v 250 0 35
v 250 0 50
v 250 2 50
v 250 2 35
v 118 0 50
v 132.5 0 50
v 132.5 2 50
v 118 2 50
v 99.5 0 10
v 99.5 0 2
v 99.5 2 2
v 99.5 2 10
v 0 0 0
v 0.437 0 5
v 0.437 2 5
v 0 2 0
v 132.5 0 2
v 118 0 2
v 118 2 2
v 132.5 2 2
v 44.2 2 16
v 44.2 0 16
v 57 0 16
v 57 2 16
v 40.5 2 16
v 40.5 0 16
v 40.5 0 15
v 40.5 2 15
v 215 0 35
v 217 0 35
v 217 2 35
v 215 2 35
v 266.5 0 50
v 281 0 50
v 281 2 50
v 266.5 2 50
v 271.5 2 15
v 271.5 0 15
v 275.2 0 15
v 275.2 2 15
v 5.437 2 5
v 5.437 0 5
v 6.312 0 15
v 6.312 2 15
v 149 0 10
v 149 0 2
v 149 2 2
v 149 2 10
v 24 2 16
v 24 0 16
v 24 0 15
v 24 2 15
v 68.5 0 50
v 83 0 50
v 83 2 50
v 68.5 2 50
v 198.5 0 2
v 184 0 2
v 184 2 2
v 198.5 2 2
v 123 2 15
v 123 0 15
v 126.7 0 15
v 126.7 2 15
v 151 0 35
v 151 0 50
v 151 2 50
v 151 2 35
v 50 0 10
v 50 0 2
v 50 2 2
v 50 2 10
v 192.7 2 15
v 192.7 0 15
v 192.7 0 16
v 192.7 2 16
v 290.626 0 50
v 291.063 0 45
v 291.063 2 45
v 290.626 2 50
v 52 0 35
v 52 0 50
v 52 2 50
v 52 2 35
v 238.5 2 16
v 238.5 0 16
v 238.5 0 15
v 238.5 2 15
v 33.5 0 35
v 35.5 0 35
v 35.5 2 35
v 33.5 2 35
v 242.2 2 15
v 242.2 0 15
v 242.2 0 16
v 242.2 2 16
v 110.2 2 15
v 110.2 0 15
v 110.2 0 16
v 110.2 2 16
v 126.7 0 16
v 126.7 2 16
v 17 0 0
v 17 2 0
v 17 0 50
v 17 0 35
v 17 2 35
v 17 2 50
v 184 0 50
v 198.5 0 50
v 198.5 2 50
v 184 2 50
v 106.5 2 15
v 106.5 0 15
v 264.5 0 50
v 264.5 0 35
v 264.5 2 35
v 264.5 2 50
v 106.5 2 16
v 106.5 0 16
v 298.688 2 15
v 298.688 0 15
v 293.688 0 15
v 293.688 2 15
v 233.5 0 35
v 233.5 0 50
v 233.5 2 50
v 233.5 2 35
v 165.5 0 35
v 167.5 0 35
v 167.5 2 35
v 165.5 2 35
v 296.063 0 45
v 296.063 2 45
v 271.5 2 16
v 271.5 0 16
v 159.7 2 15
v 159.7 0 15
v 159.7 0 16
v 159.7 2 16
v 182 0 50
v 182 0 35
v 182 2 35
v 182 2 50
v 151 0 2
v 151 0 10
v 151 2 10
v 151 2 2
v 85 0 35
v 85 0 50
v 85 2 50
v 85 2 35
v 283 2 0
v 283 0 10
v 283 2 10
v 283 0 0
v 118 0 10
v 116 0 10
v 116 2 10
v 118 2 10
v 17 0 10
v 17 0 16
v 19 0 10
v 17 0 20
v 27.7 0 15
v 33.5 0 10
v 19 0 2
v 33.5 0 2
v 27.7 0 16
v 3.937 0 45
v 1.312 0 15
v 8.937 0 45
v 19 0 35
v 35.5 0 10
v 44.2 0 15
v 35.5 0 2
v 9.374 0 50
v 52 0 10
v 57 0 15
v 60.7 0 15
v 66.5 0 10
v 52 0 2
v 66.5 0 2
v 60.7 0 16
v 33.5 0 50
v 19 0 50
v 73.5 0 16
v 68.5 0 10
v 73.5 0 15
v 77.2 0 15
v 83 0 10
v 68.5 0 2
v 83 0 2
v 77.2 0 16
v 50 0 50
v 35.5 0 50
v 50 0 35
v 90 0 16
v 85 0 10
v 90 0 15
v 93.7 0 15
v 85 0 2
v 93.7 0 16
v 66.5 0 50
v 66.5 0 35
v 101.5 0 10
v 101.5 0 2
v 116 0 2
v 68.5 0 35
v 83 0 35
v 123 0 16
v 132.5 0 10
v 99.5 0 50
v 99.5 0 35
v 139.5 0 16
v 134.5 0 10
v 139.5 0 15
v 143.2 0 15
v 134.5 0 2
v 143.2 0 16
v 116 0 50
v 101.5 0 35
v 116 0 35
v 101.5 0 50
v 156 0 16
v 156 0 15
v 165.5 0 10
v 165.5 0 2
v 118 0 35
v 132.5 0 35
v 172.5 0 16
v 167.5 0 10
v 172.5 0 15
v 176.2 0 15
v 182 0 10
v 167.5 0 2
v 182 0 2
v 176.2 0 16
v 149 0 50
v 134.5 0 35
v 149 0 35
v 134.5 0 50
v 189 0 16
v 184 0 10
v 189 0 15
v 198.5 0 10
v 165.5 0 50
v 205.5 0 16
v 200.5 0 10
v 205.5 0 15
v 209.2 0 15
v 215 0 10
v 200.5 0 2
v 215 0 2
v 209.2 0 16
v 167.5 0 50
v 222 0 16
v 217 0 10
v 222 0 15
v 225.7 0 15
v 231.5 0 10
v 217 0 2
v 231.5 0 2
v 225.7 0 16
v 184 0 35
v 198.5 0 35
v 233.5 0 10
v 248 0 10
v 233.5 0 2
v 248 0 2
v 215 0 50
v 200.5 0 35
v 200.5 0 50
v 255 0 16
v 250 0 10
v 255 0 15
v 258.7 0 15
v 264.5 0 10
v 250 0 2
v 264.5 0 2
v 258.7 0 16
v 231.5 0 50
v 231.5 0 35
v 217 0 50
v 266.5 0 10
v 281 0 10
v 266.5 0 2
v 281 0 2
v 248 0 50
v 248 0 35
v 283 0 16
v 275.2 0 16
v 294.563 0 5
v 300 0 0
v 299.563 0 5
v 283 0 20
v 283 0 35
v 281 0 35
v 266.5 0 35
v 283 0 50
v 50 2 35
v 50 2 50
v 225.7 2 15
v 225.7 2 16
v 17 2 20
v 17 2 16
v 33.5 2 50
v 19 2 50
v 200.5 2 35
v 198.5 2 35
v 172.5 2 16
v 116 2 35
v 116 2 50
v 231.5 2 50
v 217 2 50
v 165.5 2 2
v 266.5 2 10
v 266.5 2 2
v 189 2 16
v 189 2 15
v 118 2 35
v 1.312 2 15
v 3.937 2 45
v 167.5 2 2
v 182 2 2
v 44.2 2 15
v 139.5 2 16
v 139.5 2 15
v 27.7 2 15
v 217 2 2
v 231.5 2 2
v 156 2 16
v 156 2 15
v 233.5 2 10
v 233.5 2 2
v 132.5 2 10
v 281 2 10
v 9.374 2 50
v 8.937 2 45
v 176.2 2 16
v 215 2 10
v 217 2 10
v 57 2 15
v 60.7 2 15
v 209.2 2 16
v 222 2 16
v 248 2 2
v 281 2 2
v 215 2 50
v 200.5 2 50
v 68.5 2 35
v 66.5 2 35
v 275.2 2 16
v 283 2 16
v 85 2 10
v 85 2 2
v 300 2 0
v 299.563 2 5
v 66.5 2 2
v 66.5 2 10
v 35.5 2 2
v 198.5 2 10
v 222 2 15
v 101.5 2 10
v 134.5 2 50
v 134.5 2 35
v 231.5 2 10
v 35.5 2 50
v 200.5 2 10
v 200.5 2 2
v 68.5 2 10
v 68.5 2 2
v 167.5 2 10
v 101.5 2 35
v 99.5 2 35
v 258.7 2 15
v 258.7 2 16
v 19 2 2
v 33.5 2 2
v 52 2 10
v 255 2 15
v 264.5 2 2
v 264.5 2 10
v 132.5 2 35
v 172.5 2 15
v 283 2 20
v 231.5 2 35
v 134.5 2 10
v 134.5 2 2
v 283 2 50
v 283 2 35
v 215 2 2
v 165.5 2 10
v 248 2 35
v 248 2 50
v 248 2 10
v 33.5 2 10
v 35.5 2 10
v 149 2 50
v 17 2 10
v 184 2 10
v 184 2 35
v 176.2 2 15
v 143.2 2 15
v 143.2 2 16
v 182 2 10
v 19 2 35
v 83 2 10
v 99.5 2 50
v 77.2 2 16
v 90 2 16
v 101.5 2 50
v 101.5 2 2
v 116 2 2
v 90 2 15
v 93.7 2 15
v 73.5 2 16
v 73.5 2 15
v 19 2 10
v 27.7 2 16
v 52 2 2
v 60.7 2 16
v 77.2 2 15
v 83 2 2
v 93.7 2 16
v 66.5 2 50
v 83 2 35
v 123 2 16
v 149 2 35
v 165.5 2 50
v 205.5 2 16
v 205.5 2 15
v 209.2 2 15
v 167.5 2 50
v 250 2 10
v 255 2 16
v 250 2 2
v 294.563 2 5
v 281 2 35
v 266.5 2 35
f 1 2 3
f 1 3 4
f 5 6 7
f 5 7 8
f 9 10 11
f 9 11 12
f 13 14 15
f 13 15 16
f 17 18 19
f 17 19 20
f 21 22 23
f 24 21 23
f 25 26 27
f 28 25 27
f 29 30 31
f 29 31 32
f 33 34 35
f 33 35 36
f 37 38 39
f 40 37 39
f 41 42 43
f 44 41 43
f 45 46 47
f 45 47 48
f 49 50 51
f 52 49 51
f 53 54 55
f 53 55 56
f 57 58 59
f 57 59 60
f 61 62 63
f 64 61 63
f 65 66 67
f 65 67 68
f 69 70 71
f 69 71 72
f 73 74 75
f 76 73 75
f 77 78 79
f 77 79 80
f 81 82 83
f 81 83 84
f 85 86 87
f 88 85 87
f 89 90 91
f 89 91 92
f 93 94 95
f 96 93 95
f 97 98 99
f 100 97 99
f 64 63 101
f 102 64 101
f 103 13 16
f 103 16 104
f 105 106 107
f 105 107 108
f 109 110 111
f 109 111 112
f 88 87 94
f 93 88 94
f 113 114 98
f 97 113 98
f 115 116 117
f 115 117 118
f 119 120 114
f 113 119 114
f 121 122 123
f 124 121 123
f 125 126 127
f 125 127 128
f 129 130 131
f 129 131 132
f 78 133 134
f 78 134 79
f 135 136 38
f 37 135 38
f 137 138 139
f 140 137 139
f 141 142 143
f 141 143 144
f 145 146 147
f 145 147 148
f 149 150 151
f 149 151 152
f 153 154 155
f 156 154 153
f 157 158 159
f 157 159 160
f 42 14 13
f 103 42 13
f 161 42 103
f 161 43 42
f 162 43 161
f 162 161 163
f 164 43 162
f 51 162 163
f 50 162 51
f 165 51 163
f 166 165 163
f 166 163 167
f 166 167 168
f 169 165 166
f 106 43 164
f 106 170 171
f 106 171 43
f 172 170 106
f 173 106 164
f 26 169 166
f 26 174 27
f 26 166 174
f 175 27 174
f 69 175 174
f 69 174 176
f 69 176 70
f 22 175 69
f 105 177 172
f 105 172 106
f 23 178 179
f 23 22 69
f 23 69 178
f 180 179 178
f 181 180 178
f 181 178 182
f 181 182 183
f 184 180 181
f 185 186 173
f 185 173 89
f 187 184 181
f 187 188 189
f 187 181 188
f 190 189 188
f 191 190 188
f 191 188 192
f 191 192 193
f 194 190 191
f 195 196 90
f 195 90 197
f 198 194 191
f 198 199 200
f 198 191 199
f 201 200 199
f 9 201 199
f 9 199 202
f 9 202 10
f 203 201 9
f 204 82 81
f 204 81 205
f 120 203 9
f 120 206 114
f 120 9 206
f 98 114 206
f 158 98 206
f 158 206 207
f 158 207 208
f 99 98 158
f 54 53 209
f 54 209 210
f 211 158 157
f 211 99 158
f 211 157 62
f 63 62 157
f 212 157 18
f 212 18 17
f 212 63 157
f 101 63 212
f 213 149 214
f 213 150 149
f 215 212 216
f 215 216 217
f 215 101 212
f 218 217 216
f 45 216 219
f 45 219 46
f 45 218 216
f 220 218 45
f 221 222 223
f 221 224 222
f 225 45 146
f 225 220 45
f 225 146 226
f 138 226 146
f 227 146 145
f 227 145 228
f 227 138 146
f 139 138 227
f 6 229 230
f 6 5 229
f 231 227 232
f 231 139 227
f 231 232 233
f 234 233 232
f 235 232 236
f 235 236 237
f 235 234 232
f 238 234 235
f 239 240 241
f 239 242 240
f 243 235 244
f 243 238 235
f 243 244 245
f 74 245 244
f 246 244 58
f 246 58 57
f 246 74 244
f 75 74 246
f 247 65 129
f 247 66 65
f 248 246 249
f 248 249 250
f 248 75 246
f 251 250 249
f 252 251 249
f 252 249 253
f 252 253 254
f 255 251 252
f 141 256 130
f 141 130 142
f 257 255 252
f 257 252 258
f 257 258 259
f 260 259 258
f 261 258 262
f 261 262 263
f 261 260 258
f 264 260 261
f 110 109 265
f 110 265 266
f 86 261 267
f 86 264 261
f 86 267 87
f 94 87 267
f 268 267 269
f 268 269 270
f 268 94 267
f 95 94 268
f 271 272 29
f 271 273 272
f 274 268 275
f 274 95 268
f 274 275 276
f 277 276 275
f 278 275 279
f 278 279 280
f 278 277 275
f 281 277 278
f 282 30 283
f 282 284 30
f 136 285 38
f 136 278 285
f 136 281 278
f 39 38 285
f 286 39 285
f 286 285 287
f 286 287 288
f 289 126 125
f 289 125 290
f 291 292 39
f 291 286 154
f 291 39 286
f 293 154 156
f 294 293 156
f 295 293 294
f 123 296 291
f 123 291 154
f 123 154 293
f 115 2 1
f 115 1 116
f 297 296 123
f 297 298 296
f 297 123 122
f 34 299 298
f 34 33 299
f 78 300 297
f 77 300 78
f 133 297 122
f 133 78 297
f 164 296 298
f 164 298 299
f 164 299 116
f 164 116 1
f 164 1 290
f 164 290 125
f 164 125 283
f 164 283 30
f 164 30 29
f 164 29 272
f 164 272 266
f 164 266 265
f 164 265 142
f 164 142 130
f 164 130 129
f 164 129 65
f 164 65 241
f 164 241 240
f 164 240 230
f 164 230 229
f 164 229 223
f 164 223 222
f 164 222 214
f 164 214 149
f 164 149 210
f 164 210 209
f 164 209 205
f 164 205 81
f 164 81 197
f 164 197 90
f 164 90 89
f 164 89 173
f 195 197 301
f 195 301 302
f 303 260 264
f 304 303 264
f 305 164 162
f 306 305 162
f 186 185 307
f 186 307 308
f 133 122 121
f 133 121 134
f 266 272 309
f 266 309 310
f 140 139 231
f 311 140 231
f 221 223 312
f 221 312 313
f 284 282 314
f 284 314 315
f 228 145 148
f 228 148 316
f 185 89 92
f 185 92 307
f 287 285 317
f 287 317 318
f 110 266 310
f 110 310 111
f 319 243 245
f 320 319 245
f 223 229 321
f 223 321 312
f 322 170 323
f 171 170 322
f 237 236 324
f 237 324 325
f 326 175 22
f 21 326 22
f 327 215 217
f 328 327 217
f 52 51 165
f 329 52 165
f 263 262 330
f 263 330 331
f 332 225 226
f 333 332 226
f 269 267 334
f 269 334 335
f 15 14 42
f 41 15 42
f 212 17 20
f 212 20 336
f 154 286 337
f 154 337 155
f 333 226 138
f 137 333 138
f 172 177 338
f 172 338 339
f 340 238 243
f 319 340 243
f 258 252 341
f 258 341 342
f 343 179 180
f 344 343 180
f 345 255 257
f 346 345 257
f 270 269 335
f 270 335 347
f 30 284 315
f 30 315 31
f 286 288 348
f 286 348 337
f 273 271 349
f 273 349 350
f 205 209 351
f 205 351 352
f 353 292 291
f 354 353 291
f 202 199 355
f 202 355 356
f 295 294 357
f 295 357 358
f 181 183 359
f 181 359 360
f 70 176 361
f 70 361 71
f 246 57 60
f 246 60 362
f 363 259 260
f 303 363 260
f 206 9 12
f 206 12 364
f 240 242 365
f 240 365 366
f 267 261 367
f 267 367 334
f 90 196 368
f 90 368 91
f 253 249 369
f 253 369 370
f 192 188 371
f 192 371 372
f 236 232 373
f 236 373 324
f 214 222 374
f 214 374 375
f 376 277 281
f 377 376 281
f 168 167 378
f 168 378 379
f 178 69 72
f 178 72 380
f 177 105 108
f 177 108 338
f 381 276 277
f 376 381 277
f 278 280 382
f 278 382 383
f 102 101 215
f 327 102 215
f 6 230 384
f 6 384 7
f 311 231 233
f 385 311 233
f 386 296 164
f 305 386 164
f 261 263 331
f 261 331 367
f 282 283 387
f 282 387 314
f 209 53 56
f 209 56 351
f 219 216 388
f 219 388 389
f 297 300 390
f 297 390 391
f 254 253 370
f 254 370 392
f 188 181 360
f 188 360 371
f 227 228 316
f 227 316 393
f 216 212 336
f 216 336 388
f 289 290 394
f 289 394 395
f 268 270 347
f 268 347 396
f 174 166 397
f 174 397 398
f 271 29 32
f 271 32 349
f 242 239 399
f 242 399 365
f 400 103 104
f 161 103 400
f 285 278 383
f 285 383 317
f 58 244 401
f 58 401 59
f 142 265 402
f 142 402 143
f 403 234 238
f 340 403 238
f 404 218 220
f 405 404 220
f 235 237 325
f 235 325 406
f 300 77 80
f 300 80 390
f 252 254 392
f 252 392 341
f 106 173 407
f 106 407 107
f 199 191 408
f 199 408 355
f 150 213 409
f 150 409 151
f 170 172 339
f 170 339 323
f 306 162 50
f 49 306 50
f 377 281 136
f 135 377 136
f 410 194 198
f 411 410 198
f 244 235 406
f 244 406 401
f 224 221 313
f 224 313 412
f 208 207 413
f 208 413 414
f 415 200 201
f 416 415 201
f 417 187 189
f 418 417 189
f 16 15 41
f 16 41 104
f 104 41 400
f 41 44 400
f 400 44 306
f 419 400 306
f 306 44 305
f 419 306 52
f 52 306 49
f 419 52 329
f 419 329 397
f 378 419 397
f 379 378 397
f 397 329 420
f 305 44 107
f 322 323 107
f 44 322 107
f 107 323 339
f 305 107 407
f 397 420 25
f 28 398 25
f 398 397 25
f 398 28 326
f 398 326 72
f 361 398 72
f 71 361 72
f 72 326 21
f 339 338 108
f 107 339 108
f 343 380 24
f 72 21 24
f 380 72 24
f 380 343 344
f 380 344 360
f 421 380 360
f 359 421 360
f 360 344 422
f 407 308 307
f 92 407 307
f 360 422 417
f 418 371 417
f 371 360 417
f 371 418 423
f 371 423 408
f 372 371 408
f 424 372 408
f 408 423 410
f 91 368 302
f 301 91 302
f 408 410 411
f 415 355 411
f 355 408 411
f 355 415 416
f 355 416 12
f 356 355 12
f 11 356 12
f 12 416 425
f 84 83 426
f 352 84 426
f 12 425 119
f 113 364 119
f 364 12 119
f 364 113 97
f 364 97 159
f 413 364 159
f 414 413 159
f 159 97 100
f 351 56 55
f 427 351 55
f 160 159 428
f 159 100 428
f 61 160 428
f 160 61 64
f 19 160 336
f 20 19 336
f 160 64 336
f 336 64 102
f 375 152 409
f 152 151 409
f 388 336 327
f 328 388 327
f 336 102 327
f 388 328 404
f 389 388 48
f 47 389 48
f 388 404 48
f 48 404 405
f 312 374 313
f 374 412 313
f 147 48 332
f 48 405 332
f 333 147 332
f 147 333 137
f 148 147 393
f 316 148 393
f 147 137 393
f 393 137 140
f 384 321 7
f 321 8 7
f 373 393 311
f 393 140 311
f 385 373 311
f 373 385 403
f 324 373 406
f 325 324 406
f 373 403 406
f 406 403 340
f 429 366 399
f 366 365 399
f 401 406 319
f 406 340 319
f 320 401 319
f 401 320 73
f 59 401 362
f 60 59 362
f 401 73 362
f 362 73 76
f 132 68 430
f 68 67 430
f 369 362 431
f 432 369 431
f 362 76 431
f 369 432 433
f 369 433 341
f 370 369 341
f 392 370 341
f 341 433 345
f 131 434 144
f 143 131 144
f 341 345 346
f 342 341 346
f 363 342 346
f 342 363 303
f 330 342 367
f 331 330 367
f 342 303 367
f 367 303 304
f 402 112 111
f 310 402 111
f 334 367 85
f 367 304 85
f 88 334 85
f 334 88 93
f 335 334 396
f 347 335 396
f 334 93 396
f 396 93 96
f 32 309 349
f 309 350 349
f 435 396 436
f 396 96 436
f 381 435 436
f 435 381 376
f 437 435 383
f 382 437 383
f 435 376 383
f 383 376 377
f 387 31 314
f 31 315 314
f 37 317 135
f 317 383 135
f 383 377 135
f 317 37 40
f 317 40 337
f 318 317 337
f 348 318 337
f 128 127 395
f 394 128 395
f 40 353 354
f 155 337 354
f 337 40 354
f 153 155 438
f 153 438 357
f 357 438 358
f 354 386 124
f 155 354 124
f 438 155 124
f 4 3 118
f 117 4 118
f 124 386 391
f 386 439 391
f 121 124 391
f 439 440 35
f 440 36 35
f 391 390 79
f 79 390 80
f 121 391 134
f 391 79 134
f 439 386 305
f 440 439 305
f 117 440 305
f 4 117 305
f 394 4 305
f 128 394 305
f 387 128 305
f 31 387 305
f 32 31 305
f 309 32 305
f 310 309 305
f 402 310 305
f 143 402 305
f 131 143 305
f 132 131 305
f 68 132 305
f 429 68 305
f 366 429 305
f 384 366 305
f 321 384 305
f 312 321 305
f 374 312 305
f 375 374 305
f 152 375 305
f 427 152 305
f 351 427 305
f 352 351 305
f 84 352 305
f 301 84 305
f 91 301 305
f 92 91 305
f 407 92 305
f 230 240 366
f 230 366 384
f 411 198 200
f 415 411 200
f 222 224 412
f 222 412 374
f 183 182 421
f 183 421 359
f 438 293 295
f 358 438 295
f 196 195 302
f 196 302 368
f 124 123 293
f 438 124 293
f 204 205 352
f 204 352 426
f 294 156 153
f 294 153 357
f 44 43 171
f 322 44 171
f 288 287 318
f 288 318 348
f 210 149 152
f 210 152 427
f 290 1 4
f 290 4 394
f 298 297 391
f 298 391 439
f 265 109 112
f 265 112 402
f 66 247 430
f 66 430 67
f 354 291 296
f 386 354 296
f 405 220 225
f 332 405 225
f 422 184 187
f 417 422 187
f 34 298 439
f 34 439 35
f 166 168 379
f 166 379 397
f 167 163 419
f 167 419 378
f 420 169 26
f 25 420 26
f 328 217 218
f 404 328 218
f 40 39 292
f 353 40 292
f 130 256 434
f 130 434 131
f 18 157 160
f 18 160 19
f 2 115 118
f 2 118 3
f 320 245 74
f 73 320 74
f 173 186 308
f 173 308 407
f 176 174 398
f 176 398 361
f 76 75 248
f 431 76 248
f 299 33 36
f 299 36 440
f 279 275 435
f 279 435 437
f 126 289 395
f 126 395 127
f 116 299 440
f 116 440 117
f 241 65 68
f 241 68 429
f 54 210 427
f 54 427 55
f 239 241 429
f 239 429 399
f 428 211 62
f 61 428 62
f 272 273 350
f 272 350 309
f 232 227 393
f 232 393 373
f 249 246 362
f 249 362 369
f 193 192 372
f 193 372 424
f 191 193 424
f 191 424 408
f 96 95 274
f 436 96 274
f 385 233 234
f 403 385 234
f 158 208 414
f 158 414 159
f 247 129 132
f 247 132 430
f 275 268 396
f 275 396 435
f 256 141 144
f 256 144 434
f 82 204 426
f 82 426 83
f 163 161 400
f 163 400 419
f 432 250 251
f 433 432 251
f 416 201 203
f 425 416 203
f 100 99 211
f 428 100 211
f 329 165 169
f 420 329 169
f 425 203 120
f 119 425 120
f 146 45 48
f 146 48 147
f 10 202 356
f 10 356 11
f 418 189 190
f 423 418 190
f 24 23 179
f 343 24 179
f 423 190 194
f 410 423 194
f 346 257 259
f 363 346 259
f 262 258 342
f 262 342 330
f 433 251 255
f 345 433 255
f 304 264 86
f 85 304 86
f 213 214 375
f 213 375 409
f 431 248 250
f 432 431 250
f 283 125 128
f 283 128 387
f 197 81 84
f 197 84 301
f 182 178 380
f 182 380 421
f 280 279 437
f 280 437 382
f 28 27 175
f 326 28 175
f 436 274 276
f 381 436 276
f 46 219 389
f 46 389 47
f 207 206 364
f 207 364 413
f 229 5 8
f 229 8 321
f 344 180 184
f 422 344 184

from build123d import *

# Parameters (mm, degrees)
F1_DEPTH = 2
F3_DEPTH = 2


with BuildPart() as f1:
    # F0 (on Front) → F1 (new body)
    with BuildSketch(Plane.XZ):
        Polygon((3.9369898587, 45), (0, 0), (17, 0), (17, 10), (19, 10), (19, 2), (33.5, 2), (33.5, 10), (35.5, 10), (35.5, 2), (50, 2), (50, 10), (52, 10), (52, 2), (66.5, 2), (66.5, 10), (68.5, 10), (68.5, 2), (83, 2), (83, 10), (85, 10), (85, 2), (99.5, 2), (99.5, 10), (101.5, 10), (101.5, 2), (116, 2), (116, 10), (118, 10), (118, 2), (132.5, 2), (132.5, 10), (134.5, 10), (134.5, 2), (149, 2), (149, 10), (151, 10), (151, 2), (165.5, 2), (165.5, 10), (167.5, 10), (167.5, 2), (182, 2), (182, 10), (184, 10), (184, 2), (198.5, 2), (198.5, 10), (200.5, 10), (200.5, 2), (215, 2), (215, 10), (217, 10), (217, 2), (231.5, 2), (231.5, 10), (233.5, 10), (233.5, 2), (248, 2), (248, 10), (250, 10), (250, 2), (264.5, 2), (264.5, 10), (266.5, 10), (266.5, 2), (281, 2), (281, 10), (283, 10), (283, 0), (300, 0), (296.0630101413, 45), (291.0630101413, 45), (290.6255668237, 50), (283, 50), (283, 35), (281, 35), (281, 50), (266.5, 50), (266.5, 35), (264.5, 35), (264.5, 50), (250, 50), (250, 35), (248, 35), (248, 50), (233.5, 50), (233.5, 35), (231.5, 35), (231.5, 50), (217, 50), (217, 35), (215, 35), (215, 50), (200.5, 50), (200.5, 35), (198.5, 35), (198.5, 50), (184, 50), (184, 35), (182, 35), (182, 50), (167.5, 50), (167.5, 35), (165.5, 35), (165.5, 50), (151, 50), (151, 35), (149, 35), (149, 50), (134.5, 50), (134.5, 35), (132.5, 35), (132.5, 50), (118, 50), (118, 35), (116, 35), (116, 50), (101.5, 50), (101.5, 35), (99.5, 35), (99.5, 50), (85, 50), (85, 35), (83, 35), (83, 50), (68.5, 50), (68.5, 35), (66.5, 35), (66.5, 50), (52, 50), (52, 35), (50, 35), (50, 50), (35.5, 50), (35.5, 35), (33.5, 35), (33.5, 50), (19, 50), (19, 35), (17, 35), (17, 50), (9.3744331763, 50), (8.9369898587, 45), align=None)
    extrude(amount=-F1_DEPTH)

    # F2 (on Front) → F3 (cut, through all)
    with BuildSketch(Plane.XZ):
        Polygon((283, 20), (17, 20), (17, 16), (24, 16), (24, 15), (27.7, 15), (27.7, 16), (40.5, 16), (40.5, 15), (44.2, 15), (44.2, 16), (57, 16), (57, 15), (60.7, 15), (60.7, 16), (73.5, 16), (73.5, 15), (77.2, 15), (77.2, 16), (90, 16), (90, 15), (93.7, 15), (93.7, 16), (106.5, 16), (106.5, 15), (110.2, 15), (110.2, 16), (123, 16), (123, 15), (126.7, 15), (126.7, 16), (139.5, 16), (139.5, 15), (143.2, 15), (143.2, 16), (156, 16), (156, 15), (159.7, 15), (159.7, 16), (172.5, 16), (172.5, 15), (176.2, 15), (176.2, 16), (189, 16), (189, 15), (192.7, 15), (192.7, 16), (205.5, 16), (205.5, 15), (209.2, 15), (209.2, 16), (222, 16), (222, 15), (225.7, 15), (225.7, 16), (238.5, 16), (238.5, 15), (242.2, 15), (242.2, 16), (255, 16), (255, 15), (258.7, 15), (258.7, 16), (271.5, 16), (271.5, 15), (275.2, 15), (275.2, 16), (283, 16), align=None)
        Polygon((1.3123299529, 15), (0.4374433176, 5), (5.4374433176, 5), (6.3123299529, 15), align=None)
        Polygon((298.6876700471, 15), (293.6876700471, 15), (294.5625566824, 5), (299.5625566824, 5), align=None)
    extrude(amount=-F3_DEPTH, mode=Mode.SUBTRACT)


solid = f1.part
